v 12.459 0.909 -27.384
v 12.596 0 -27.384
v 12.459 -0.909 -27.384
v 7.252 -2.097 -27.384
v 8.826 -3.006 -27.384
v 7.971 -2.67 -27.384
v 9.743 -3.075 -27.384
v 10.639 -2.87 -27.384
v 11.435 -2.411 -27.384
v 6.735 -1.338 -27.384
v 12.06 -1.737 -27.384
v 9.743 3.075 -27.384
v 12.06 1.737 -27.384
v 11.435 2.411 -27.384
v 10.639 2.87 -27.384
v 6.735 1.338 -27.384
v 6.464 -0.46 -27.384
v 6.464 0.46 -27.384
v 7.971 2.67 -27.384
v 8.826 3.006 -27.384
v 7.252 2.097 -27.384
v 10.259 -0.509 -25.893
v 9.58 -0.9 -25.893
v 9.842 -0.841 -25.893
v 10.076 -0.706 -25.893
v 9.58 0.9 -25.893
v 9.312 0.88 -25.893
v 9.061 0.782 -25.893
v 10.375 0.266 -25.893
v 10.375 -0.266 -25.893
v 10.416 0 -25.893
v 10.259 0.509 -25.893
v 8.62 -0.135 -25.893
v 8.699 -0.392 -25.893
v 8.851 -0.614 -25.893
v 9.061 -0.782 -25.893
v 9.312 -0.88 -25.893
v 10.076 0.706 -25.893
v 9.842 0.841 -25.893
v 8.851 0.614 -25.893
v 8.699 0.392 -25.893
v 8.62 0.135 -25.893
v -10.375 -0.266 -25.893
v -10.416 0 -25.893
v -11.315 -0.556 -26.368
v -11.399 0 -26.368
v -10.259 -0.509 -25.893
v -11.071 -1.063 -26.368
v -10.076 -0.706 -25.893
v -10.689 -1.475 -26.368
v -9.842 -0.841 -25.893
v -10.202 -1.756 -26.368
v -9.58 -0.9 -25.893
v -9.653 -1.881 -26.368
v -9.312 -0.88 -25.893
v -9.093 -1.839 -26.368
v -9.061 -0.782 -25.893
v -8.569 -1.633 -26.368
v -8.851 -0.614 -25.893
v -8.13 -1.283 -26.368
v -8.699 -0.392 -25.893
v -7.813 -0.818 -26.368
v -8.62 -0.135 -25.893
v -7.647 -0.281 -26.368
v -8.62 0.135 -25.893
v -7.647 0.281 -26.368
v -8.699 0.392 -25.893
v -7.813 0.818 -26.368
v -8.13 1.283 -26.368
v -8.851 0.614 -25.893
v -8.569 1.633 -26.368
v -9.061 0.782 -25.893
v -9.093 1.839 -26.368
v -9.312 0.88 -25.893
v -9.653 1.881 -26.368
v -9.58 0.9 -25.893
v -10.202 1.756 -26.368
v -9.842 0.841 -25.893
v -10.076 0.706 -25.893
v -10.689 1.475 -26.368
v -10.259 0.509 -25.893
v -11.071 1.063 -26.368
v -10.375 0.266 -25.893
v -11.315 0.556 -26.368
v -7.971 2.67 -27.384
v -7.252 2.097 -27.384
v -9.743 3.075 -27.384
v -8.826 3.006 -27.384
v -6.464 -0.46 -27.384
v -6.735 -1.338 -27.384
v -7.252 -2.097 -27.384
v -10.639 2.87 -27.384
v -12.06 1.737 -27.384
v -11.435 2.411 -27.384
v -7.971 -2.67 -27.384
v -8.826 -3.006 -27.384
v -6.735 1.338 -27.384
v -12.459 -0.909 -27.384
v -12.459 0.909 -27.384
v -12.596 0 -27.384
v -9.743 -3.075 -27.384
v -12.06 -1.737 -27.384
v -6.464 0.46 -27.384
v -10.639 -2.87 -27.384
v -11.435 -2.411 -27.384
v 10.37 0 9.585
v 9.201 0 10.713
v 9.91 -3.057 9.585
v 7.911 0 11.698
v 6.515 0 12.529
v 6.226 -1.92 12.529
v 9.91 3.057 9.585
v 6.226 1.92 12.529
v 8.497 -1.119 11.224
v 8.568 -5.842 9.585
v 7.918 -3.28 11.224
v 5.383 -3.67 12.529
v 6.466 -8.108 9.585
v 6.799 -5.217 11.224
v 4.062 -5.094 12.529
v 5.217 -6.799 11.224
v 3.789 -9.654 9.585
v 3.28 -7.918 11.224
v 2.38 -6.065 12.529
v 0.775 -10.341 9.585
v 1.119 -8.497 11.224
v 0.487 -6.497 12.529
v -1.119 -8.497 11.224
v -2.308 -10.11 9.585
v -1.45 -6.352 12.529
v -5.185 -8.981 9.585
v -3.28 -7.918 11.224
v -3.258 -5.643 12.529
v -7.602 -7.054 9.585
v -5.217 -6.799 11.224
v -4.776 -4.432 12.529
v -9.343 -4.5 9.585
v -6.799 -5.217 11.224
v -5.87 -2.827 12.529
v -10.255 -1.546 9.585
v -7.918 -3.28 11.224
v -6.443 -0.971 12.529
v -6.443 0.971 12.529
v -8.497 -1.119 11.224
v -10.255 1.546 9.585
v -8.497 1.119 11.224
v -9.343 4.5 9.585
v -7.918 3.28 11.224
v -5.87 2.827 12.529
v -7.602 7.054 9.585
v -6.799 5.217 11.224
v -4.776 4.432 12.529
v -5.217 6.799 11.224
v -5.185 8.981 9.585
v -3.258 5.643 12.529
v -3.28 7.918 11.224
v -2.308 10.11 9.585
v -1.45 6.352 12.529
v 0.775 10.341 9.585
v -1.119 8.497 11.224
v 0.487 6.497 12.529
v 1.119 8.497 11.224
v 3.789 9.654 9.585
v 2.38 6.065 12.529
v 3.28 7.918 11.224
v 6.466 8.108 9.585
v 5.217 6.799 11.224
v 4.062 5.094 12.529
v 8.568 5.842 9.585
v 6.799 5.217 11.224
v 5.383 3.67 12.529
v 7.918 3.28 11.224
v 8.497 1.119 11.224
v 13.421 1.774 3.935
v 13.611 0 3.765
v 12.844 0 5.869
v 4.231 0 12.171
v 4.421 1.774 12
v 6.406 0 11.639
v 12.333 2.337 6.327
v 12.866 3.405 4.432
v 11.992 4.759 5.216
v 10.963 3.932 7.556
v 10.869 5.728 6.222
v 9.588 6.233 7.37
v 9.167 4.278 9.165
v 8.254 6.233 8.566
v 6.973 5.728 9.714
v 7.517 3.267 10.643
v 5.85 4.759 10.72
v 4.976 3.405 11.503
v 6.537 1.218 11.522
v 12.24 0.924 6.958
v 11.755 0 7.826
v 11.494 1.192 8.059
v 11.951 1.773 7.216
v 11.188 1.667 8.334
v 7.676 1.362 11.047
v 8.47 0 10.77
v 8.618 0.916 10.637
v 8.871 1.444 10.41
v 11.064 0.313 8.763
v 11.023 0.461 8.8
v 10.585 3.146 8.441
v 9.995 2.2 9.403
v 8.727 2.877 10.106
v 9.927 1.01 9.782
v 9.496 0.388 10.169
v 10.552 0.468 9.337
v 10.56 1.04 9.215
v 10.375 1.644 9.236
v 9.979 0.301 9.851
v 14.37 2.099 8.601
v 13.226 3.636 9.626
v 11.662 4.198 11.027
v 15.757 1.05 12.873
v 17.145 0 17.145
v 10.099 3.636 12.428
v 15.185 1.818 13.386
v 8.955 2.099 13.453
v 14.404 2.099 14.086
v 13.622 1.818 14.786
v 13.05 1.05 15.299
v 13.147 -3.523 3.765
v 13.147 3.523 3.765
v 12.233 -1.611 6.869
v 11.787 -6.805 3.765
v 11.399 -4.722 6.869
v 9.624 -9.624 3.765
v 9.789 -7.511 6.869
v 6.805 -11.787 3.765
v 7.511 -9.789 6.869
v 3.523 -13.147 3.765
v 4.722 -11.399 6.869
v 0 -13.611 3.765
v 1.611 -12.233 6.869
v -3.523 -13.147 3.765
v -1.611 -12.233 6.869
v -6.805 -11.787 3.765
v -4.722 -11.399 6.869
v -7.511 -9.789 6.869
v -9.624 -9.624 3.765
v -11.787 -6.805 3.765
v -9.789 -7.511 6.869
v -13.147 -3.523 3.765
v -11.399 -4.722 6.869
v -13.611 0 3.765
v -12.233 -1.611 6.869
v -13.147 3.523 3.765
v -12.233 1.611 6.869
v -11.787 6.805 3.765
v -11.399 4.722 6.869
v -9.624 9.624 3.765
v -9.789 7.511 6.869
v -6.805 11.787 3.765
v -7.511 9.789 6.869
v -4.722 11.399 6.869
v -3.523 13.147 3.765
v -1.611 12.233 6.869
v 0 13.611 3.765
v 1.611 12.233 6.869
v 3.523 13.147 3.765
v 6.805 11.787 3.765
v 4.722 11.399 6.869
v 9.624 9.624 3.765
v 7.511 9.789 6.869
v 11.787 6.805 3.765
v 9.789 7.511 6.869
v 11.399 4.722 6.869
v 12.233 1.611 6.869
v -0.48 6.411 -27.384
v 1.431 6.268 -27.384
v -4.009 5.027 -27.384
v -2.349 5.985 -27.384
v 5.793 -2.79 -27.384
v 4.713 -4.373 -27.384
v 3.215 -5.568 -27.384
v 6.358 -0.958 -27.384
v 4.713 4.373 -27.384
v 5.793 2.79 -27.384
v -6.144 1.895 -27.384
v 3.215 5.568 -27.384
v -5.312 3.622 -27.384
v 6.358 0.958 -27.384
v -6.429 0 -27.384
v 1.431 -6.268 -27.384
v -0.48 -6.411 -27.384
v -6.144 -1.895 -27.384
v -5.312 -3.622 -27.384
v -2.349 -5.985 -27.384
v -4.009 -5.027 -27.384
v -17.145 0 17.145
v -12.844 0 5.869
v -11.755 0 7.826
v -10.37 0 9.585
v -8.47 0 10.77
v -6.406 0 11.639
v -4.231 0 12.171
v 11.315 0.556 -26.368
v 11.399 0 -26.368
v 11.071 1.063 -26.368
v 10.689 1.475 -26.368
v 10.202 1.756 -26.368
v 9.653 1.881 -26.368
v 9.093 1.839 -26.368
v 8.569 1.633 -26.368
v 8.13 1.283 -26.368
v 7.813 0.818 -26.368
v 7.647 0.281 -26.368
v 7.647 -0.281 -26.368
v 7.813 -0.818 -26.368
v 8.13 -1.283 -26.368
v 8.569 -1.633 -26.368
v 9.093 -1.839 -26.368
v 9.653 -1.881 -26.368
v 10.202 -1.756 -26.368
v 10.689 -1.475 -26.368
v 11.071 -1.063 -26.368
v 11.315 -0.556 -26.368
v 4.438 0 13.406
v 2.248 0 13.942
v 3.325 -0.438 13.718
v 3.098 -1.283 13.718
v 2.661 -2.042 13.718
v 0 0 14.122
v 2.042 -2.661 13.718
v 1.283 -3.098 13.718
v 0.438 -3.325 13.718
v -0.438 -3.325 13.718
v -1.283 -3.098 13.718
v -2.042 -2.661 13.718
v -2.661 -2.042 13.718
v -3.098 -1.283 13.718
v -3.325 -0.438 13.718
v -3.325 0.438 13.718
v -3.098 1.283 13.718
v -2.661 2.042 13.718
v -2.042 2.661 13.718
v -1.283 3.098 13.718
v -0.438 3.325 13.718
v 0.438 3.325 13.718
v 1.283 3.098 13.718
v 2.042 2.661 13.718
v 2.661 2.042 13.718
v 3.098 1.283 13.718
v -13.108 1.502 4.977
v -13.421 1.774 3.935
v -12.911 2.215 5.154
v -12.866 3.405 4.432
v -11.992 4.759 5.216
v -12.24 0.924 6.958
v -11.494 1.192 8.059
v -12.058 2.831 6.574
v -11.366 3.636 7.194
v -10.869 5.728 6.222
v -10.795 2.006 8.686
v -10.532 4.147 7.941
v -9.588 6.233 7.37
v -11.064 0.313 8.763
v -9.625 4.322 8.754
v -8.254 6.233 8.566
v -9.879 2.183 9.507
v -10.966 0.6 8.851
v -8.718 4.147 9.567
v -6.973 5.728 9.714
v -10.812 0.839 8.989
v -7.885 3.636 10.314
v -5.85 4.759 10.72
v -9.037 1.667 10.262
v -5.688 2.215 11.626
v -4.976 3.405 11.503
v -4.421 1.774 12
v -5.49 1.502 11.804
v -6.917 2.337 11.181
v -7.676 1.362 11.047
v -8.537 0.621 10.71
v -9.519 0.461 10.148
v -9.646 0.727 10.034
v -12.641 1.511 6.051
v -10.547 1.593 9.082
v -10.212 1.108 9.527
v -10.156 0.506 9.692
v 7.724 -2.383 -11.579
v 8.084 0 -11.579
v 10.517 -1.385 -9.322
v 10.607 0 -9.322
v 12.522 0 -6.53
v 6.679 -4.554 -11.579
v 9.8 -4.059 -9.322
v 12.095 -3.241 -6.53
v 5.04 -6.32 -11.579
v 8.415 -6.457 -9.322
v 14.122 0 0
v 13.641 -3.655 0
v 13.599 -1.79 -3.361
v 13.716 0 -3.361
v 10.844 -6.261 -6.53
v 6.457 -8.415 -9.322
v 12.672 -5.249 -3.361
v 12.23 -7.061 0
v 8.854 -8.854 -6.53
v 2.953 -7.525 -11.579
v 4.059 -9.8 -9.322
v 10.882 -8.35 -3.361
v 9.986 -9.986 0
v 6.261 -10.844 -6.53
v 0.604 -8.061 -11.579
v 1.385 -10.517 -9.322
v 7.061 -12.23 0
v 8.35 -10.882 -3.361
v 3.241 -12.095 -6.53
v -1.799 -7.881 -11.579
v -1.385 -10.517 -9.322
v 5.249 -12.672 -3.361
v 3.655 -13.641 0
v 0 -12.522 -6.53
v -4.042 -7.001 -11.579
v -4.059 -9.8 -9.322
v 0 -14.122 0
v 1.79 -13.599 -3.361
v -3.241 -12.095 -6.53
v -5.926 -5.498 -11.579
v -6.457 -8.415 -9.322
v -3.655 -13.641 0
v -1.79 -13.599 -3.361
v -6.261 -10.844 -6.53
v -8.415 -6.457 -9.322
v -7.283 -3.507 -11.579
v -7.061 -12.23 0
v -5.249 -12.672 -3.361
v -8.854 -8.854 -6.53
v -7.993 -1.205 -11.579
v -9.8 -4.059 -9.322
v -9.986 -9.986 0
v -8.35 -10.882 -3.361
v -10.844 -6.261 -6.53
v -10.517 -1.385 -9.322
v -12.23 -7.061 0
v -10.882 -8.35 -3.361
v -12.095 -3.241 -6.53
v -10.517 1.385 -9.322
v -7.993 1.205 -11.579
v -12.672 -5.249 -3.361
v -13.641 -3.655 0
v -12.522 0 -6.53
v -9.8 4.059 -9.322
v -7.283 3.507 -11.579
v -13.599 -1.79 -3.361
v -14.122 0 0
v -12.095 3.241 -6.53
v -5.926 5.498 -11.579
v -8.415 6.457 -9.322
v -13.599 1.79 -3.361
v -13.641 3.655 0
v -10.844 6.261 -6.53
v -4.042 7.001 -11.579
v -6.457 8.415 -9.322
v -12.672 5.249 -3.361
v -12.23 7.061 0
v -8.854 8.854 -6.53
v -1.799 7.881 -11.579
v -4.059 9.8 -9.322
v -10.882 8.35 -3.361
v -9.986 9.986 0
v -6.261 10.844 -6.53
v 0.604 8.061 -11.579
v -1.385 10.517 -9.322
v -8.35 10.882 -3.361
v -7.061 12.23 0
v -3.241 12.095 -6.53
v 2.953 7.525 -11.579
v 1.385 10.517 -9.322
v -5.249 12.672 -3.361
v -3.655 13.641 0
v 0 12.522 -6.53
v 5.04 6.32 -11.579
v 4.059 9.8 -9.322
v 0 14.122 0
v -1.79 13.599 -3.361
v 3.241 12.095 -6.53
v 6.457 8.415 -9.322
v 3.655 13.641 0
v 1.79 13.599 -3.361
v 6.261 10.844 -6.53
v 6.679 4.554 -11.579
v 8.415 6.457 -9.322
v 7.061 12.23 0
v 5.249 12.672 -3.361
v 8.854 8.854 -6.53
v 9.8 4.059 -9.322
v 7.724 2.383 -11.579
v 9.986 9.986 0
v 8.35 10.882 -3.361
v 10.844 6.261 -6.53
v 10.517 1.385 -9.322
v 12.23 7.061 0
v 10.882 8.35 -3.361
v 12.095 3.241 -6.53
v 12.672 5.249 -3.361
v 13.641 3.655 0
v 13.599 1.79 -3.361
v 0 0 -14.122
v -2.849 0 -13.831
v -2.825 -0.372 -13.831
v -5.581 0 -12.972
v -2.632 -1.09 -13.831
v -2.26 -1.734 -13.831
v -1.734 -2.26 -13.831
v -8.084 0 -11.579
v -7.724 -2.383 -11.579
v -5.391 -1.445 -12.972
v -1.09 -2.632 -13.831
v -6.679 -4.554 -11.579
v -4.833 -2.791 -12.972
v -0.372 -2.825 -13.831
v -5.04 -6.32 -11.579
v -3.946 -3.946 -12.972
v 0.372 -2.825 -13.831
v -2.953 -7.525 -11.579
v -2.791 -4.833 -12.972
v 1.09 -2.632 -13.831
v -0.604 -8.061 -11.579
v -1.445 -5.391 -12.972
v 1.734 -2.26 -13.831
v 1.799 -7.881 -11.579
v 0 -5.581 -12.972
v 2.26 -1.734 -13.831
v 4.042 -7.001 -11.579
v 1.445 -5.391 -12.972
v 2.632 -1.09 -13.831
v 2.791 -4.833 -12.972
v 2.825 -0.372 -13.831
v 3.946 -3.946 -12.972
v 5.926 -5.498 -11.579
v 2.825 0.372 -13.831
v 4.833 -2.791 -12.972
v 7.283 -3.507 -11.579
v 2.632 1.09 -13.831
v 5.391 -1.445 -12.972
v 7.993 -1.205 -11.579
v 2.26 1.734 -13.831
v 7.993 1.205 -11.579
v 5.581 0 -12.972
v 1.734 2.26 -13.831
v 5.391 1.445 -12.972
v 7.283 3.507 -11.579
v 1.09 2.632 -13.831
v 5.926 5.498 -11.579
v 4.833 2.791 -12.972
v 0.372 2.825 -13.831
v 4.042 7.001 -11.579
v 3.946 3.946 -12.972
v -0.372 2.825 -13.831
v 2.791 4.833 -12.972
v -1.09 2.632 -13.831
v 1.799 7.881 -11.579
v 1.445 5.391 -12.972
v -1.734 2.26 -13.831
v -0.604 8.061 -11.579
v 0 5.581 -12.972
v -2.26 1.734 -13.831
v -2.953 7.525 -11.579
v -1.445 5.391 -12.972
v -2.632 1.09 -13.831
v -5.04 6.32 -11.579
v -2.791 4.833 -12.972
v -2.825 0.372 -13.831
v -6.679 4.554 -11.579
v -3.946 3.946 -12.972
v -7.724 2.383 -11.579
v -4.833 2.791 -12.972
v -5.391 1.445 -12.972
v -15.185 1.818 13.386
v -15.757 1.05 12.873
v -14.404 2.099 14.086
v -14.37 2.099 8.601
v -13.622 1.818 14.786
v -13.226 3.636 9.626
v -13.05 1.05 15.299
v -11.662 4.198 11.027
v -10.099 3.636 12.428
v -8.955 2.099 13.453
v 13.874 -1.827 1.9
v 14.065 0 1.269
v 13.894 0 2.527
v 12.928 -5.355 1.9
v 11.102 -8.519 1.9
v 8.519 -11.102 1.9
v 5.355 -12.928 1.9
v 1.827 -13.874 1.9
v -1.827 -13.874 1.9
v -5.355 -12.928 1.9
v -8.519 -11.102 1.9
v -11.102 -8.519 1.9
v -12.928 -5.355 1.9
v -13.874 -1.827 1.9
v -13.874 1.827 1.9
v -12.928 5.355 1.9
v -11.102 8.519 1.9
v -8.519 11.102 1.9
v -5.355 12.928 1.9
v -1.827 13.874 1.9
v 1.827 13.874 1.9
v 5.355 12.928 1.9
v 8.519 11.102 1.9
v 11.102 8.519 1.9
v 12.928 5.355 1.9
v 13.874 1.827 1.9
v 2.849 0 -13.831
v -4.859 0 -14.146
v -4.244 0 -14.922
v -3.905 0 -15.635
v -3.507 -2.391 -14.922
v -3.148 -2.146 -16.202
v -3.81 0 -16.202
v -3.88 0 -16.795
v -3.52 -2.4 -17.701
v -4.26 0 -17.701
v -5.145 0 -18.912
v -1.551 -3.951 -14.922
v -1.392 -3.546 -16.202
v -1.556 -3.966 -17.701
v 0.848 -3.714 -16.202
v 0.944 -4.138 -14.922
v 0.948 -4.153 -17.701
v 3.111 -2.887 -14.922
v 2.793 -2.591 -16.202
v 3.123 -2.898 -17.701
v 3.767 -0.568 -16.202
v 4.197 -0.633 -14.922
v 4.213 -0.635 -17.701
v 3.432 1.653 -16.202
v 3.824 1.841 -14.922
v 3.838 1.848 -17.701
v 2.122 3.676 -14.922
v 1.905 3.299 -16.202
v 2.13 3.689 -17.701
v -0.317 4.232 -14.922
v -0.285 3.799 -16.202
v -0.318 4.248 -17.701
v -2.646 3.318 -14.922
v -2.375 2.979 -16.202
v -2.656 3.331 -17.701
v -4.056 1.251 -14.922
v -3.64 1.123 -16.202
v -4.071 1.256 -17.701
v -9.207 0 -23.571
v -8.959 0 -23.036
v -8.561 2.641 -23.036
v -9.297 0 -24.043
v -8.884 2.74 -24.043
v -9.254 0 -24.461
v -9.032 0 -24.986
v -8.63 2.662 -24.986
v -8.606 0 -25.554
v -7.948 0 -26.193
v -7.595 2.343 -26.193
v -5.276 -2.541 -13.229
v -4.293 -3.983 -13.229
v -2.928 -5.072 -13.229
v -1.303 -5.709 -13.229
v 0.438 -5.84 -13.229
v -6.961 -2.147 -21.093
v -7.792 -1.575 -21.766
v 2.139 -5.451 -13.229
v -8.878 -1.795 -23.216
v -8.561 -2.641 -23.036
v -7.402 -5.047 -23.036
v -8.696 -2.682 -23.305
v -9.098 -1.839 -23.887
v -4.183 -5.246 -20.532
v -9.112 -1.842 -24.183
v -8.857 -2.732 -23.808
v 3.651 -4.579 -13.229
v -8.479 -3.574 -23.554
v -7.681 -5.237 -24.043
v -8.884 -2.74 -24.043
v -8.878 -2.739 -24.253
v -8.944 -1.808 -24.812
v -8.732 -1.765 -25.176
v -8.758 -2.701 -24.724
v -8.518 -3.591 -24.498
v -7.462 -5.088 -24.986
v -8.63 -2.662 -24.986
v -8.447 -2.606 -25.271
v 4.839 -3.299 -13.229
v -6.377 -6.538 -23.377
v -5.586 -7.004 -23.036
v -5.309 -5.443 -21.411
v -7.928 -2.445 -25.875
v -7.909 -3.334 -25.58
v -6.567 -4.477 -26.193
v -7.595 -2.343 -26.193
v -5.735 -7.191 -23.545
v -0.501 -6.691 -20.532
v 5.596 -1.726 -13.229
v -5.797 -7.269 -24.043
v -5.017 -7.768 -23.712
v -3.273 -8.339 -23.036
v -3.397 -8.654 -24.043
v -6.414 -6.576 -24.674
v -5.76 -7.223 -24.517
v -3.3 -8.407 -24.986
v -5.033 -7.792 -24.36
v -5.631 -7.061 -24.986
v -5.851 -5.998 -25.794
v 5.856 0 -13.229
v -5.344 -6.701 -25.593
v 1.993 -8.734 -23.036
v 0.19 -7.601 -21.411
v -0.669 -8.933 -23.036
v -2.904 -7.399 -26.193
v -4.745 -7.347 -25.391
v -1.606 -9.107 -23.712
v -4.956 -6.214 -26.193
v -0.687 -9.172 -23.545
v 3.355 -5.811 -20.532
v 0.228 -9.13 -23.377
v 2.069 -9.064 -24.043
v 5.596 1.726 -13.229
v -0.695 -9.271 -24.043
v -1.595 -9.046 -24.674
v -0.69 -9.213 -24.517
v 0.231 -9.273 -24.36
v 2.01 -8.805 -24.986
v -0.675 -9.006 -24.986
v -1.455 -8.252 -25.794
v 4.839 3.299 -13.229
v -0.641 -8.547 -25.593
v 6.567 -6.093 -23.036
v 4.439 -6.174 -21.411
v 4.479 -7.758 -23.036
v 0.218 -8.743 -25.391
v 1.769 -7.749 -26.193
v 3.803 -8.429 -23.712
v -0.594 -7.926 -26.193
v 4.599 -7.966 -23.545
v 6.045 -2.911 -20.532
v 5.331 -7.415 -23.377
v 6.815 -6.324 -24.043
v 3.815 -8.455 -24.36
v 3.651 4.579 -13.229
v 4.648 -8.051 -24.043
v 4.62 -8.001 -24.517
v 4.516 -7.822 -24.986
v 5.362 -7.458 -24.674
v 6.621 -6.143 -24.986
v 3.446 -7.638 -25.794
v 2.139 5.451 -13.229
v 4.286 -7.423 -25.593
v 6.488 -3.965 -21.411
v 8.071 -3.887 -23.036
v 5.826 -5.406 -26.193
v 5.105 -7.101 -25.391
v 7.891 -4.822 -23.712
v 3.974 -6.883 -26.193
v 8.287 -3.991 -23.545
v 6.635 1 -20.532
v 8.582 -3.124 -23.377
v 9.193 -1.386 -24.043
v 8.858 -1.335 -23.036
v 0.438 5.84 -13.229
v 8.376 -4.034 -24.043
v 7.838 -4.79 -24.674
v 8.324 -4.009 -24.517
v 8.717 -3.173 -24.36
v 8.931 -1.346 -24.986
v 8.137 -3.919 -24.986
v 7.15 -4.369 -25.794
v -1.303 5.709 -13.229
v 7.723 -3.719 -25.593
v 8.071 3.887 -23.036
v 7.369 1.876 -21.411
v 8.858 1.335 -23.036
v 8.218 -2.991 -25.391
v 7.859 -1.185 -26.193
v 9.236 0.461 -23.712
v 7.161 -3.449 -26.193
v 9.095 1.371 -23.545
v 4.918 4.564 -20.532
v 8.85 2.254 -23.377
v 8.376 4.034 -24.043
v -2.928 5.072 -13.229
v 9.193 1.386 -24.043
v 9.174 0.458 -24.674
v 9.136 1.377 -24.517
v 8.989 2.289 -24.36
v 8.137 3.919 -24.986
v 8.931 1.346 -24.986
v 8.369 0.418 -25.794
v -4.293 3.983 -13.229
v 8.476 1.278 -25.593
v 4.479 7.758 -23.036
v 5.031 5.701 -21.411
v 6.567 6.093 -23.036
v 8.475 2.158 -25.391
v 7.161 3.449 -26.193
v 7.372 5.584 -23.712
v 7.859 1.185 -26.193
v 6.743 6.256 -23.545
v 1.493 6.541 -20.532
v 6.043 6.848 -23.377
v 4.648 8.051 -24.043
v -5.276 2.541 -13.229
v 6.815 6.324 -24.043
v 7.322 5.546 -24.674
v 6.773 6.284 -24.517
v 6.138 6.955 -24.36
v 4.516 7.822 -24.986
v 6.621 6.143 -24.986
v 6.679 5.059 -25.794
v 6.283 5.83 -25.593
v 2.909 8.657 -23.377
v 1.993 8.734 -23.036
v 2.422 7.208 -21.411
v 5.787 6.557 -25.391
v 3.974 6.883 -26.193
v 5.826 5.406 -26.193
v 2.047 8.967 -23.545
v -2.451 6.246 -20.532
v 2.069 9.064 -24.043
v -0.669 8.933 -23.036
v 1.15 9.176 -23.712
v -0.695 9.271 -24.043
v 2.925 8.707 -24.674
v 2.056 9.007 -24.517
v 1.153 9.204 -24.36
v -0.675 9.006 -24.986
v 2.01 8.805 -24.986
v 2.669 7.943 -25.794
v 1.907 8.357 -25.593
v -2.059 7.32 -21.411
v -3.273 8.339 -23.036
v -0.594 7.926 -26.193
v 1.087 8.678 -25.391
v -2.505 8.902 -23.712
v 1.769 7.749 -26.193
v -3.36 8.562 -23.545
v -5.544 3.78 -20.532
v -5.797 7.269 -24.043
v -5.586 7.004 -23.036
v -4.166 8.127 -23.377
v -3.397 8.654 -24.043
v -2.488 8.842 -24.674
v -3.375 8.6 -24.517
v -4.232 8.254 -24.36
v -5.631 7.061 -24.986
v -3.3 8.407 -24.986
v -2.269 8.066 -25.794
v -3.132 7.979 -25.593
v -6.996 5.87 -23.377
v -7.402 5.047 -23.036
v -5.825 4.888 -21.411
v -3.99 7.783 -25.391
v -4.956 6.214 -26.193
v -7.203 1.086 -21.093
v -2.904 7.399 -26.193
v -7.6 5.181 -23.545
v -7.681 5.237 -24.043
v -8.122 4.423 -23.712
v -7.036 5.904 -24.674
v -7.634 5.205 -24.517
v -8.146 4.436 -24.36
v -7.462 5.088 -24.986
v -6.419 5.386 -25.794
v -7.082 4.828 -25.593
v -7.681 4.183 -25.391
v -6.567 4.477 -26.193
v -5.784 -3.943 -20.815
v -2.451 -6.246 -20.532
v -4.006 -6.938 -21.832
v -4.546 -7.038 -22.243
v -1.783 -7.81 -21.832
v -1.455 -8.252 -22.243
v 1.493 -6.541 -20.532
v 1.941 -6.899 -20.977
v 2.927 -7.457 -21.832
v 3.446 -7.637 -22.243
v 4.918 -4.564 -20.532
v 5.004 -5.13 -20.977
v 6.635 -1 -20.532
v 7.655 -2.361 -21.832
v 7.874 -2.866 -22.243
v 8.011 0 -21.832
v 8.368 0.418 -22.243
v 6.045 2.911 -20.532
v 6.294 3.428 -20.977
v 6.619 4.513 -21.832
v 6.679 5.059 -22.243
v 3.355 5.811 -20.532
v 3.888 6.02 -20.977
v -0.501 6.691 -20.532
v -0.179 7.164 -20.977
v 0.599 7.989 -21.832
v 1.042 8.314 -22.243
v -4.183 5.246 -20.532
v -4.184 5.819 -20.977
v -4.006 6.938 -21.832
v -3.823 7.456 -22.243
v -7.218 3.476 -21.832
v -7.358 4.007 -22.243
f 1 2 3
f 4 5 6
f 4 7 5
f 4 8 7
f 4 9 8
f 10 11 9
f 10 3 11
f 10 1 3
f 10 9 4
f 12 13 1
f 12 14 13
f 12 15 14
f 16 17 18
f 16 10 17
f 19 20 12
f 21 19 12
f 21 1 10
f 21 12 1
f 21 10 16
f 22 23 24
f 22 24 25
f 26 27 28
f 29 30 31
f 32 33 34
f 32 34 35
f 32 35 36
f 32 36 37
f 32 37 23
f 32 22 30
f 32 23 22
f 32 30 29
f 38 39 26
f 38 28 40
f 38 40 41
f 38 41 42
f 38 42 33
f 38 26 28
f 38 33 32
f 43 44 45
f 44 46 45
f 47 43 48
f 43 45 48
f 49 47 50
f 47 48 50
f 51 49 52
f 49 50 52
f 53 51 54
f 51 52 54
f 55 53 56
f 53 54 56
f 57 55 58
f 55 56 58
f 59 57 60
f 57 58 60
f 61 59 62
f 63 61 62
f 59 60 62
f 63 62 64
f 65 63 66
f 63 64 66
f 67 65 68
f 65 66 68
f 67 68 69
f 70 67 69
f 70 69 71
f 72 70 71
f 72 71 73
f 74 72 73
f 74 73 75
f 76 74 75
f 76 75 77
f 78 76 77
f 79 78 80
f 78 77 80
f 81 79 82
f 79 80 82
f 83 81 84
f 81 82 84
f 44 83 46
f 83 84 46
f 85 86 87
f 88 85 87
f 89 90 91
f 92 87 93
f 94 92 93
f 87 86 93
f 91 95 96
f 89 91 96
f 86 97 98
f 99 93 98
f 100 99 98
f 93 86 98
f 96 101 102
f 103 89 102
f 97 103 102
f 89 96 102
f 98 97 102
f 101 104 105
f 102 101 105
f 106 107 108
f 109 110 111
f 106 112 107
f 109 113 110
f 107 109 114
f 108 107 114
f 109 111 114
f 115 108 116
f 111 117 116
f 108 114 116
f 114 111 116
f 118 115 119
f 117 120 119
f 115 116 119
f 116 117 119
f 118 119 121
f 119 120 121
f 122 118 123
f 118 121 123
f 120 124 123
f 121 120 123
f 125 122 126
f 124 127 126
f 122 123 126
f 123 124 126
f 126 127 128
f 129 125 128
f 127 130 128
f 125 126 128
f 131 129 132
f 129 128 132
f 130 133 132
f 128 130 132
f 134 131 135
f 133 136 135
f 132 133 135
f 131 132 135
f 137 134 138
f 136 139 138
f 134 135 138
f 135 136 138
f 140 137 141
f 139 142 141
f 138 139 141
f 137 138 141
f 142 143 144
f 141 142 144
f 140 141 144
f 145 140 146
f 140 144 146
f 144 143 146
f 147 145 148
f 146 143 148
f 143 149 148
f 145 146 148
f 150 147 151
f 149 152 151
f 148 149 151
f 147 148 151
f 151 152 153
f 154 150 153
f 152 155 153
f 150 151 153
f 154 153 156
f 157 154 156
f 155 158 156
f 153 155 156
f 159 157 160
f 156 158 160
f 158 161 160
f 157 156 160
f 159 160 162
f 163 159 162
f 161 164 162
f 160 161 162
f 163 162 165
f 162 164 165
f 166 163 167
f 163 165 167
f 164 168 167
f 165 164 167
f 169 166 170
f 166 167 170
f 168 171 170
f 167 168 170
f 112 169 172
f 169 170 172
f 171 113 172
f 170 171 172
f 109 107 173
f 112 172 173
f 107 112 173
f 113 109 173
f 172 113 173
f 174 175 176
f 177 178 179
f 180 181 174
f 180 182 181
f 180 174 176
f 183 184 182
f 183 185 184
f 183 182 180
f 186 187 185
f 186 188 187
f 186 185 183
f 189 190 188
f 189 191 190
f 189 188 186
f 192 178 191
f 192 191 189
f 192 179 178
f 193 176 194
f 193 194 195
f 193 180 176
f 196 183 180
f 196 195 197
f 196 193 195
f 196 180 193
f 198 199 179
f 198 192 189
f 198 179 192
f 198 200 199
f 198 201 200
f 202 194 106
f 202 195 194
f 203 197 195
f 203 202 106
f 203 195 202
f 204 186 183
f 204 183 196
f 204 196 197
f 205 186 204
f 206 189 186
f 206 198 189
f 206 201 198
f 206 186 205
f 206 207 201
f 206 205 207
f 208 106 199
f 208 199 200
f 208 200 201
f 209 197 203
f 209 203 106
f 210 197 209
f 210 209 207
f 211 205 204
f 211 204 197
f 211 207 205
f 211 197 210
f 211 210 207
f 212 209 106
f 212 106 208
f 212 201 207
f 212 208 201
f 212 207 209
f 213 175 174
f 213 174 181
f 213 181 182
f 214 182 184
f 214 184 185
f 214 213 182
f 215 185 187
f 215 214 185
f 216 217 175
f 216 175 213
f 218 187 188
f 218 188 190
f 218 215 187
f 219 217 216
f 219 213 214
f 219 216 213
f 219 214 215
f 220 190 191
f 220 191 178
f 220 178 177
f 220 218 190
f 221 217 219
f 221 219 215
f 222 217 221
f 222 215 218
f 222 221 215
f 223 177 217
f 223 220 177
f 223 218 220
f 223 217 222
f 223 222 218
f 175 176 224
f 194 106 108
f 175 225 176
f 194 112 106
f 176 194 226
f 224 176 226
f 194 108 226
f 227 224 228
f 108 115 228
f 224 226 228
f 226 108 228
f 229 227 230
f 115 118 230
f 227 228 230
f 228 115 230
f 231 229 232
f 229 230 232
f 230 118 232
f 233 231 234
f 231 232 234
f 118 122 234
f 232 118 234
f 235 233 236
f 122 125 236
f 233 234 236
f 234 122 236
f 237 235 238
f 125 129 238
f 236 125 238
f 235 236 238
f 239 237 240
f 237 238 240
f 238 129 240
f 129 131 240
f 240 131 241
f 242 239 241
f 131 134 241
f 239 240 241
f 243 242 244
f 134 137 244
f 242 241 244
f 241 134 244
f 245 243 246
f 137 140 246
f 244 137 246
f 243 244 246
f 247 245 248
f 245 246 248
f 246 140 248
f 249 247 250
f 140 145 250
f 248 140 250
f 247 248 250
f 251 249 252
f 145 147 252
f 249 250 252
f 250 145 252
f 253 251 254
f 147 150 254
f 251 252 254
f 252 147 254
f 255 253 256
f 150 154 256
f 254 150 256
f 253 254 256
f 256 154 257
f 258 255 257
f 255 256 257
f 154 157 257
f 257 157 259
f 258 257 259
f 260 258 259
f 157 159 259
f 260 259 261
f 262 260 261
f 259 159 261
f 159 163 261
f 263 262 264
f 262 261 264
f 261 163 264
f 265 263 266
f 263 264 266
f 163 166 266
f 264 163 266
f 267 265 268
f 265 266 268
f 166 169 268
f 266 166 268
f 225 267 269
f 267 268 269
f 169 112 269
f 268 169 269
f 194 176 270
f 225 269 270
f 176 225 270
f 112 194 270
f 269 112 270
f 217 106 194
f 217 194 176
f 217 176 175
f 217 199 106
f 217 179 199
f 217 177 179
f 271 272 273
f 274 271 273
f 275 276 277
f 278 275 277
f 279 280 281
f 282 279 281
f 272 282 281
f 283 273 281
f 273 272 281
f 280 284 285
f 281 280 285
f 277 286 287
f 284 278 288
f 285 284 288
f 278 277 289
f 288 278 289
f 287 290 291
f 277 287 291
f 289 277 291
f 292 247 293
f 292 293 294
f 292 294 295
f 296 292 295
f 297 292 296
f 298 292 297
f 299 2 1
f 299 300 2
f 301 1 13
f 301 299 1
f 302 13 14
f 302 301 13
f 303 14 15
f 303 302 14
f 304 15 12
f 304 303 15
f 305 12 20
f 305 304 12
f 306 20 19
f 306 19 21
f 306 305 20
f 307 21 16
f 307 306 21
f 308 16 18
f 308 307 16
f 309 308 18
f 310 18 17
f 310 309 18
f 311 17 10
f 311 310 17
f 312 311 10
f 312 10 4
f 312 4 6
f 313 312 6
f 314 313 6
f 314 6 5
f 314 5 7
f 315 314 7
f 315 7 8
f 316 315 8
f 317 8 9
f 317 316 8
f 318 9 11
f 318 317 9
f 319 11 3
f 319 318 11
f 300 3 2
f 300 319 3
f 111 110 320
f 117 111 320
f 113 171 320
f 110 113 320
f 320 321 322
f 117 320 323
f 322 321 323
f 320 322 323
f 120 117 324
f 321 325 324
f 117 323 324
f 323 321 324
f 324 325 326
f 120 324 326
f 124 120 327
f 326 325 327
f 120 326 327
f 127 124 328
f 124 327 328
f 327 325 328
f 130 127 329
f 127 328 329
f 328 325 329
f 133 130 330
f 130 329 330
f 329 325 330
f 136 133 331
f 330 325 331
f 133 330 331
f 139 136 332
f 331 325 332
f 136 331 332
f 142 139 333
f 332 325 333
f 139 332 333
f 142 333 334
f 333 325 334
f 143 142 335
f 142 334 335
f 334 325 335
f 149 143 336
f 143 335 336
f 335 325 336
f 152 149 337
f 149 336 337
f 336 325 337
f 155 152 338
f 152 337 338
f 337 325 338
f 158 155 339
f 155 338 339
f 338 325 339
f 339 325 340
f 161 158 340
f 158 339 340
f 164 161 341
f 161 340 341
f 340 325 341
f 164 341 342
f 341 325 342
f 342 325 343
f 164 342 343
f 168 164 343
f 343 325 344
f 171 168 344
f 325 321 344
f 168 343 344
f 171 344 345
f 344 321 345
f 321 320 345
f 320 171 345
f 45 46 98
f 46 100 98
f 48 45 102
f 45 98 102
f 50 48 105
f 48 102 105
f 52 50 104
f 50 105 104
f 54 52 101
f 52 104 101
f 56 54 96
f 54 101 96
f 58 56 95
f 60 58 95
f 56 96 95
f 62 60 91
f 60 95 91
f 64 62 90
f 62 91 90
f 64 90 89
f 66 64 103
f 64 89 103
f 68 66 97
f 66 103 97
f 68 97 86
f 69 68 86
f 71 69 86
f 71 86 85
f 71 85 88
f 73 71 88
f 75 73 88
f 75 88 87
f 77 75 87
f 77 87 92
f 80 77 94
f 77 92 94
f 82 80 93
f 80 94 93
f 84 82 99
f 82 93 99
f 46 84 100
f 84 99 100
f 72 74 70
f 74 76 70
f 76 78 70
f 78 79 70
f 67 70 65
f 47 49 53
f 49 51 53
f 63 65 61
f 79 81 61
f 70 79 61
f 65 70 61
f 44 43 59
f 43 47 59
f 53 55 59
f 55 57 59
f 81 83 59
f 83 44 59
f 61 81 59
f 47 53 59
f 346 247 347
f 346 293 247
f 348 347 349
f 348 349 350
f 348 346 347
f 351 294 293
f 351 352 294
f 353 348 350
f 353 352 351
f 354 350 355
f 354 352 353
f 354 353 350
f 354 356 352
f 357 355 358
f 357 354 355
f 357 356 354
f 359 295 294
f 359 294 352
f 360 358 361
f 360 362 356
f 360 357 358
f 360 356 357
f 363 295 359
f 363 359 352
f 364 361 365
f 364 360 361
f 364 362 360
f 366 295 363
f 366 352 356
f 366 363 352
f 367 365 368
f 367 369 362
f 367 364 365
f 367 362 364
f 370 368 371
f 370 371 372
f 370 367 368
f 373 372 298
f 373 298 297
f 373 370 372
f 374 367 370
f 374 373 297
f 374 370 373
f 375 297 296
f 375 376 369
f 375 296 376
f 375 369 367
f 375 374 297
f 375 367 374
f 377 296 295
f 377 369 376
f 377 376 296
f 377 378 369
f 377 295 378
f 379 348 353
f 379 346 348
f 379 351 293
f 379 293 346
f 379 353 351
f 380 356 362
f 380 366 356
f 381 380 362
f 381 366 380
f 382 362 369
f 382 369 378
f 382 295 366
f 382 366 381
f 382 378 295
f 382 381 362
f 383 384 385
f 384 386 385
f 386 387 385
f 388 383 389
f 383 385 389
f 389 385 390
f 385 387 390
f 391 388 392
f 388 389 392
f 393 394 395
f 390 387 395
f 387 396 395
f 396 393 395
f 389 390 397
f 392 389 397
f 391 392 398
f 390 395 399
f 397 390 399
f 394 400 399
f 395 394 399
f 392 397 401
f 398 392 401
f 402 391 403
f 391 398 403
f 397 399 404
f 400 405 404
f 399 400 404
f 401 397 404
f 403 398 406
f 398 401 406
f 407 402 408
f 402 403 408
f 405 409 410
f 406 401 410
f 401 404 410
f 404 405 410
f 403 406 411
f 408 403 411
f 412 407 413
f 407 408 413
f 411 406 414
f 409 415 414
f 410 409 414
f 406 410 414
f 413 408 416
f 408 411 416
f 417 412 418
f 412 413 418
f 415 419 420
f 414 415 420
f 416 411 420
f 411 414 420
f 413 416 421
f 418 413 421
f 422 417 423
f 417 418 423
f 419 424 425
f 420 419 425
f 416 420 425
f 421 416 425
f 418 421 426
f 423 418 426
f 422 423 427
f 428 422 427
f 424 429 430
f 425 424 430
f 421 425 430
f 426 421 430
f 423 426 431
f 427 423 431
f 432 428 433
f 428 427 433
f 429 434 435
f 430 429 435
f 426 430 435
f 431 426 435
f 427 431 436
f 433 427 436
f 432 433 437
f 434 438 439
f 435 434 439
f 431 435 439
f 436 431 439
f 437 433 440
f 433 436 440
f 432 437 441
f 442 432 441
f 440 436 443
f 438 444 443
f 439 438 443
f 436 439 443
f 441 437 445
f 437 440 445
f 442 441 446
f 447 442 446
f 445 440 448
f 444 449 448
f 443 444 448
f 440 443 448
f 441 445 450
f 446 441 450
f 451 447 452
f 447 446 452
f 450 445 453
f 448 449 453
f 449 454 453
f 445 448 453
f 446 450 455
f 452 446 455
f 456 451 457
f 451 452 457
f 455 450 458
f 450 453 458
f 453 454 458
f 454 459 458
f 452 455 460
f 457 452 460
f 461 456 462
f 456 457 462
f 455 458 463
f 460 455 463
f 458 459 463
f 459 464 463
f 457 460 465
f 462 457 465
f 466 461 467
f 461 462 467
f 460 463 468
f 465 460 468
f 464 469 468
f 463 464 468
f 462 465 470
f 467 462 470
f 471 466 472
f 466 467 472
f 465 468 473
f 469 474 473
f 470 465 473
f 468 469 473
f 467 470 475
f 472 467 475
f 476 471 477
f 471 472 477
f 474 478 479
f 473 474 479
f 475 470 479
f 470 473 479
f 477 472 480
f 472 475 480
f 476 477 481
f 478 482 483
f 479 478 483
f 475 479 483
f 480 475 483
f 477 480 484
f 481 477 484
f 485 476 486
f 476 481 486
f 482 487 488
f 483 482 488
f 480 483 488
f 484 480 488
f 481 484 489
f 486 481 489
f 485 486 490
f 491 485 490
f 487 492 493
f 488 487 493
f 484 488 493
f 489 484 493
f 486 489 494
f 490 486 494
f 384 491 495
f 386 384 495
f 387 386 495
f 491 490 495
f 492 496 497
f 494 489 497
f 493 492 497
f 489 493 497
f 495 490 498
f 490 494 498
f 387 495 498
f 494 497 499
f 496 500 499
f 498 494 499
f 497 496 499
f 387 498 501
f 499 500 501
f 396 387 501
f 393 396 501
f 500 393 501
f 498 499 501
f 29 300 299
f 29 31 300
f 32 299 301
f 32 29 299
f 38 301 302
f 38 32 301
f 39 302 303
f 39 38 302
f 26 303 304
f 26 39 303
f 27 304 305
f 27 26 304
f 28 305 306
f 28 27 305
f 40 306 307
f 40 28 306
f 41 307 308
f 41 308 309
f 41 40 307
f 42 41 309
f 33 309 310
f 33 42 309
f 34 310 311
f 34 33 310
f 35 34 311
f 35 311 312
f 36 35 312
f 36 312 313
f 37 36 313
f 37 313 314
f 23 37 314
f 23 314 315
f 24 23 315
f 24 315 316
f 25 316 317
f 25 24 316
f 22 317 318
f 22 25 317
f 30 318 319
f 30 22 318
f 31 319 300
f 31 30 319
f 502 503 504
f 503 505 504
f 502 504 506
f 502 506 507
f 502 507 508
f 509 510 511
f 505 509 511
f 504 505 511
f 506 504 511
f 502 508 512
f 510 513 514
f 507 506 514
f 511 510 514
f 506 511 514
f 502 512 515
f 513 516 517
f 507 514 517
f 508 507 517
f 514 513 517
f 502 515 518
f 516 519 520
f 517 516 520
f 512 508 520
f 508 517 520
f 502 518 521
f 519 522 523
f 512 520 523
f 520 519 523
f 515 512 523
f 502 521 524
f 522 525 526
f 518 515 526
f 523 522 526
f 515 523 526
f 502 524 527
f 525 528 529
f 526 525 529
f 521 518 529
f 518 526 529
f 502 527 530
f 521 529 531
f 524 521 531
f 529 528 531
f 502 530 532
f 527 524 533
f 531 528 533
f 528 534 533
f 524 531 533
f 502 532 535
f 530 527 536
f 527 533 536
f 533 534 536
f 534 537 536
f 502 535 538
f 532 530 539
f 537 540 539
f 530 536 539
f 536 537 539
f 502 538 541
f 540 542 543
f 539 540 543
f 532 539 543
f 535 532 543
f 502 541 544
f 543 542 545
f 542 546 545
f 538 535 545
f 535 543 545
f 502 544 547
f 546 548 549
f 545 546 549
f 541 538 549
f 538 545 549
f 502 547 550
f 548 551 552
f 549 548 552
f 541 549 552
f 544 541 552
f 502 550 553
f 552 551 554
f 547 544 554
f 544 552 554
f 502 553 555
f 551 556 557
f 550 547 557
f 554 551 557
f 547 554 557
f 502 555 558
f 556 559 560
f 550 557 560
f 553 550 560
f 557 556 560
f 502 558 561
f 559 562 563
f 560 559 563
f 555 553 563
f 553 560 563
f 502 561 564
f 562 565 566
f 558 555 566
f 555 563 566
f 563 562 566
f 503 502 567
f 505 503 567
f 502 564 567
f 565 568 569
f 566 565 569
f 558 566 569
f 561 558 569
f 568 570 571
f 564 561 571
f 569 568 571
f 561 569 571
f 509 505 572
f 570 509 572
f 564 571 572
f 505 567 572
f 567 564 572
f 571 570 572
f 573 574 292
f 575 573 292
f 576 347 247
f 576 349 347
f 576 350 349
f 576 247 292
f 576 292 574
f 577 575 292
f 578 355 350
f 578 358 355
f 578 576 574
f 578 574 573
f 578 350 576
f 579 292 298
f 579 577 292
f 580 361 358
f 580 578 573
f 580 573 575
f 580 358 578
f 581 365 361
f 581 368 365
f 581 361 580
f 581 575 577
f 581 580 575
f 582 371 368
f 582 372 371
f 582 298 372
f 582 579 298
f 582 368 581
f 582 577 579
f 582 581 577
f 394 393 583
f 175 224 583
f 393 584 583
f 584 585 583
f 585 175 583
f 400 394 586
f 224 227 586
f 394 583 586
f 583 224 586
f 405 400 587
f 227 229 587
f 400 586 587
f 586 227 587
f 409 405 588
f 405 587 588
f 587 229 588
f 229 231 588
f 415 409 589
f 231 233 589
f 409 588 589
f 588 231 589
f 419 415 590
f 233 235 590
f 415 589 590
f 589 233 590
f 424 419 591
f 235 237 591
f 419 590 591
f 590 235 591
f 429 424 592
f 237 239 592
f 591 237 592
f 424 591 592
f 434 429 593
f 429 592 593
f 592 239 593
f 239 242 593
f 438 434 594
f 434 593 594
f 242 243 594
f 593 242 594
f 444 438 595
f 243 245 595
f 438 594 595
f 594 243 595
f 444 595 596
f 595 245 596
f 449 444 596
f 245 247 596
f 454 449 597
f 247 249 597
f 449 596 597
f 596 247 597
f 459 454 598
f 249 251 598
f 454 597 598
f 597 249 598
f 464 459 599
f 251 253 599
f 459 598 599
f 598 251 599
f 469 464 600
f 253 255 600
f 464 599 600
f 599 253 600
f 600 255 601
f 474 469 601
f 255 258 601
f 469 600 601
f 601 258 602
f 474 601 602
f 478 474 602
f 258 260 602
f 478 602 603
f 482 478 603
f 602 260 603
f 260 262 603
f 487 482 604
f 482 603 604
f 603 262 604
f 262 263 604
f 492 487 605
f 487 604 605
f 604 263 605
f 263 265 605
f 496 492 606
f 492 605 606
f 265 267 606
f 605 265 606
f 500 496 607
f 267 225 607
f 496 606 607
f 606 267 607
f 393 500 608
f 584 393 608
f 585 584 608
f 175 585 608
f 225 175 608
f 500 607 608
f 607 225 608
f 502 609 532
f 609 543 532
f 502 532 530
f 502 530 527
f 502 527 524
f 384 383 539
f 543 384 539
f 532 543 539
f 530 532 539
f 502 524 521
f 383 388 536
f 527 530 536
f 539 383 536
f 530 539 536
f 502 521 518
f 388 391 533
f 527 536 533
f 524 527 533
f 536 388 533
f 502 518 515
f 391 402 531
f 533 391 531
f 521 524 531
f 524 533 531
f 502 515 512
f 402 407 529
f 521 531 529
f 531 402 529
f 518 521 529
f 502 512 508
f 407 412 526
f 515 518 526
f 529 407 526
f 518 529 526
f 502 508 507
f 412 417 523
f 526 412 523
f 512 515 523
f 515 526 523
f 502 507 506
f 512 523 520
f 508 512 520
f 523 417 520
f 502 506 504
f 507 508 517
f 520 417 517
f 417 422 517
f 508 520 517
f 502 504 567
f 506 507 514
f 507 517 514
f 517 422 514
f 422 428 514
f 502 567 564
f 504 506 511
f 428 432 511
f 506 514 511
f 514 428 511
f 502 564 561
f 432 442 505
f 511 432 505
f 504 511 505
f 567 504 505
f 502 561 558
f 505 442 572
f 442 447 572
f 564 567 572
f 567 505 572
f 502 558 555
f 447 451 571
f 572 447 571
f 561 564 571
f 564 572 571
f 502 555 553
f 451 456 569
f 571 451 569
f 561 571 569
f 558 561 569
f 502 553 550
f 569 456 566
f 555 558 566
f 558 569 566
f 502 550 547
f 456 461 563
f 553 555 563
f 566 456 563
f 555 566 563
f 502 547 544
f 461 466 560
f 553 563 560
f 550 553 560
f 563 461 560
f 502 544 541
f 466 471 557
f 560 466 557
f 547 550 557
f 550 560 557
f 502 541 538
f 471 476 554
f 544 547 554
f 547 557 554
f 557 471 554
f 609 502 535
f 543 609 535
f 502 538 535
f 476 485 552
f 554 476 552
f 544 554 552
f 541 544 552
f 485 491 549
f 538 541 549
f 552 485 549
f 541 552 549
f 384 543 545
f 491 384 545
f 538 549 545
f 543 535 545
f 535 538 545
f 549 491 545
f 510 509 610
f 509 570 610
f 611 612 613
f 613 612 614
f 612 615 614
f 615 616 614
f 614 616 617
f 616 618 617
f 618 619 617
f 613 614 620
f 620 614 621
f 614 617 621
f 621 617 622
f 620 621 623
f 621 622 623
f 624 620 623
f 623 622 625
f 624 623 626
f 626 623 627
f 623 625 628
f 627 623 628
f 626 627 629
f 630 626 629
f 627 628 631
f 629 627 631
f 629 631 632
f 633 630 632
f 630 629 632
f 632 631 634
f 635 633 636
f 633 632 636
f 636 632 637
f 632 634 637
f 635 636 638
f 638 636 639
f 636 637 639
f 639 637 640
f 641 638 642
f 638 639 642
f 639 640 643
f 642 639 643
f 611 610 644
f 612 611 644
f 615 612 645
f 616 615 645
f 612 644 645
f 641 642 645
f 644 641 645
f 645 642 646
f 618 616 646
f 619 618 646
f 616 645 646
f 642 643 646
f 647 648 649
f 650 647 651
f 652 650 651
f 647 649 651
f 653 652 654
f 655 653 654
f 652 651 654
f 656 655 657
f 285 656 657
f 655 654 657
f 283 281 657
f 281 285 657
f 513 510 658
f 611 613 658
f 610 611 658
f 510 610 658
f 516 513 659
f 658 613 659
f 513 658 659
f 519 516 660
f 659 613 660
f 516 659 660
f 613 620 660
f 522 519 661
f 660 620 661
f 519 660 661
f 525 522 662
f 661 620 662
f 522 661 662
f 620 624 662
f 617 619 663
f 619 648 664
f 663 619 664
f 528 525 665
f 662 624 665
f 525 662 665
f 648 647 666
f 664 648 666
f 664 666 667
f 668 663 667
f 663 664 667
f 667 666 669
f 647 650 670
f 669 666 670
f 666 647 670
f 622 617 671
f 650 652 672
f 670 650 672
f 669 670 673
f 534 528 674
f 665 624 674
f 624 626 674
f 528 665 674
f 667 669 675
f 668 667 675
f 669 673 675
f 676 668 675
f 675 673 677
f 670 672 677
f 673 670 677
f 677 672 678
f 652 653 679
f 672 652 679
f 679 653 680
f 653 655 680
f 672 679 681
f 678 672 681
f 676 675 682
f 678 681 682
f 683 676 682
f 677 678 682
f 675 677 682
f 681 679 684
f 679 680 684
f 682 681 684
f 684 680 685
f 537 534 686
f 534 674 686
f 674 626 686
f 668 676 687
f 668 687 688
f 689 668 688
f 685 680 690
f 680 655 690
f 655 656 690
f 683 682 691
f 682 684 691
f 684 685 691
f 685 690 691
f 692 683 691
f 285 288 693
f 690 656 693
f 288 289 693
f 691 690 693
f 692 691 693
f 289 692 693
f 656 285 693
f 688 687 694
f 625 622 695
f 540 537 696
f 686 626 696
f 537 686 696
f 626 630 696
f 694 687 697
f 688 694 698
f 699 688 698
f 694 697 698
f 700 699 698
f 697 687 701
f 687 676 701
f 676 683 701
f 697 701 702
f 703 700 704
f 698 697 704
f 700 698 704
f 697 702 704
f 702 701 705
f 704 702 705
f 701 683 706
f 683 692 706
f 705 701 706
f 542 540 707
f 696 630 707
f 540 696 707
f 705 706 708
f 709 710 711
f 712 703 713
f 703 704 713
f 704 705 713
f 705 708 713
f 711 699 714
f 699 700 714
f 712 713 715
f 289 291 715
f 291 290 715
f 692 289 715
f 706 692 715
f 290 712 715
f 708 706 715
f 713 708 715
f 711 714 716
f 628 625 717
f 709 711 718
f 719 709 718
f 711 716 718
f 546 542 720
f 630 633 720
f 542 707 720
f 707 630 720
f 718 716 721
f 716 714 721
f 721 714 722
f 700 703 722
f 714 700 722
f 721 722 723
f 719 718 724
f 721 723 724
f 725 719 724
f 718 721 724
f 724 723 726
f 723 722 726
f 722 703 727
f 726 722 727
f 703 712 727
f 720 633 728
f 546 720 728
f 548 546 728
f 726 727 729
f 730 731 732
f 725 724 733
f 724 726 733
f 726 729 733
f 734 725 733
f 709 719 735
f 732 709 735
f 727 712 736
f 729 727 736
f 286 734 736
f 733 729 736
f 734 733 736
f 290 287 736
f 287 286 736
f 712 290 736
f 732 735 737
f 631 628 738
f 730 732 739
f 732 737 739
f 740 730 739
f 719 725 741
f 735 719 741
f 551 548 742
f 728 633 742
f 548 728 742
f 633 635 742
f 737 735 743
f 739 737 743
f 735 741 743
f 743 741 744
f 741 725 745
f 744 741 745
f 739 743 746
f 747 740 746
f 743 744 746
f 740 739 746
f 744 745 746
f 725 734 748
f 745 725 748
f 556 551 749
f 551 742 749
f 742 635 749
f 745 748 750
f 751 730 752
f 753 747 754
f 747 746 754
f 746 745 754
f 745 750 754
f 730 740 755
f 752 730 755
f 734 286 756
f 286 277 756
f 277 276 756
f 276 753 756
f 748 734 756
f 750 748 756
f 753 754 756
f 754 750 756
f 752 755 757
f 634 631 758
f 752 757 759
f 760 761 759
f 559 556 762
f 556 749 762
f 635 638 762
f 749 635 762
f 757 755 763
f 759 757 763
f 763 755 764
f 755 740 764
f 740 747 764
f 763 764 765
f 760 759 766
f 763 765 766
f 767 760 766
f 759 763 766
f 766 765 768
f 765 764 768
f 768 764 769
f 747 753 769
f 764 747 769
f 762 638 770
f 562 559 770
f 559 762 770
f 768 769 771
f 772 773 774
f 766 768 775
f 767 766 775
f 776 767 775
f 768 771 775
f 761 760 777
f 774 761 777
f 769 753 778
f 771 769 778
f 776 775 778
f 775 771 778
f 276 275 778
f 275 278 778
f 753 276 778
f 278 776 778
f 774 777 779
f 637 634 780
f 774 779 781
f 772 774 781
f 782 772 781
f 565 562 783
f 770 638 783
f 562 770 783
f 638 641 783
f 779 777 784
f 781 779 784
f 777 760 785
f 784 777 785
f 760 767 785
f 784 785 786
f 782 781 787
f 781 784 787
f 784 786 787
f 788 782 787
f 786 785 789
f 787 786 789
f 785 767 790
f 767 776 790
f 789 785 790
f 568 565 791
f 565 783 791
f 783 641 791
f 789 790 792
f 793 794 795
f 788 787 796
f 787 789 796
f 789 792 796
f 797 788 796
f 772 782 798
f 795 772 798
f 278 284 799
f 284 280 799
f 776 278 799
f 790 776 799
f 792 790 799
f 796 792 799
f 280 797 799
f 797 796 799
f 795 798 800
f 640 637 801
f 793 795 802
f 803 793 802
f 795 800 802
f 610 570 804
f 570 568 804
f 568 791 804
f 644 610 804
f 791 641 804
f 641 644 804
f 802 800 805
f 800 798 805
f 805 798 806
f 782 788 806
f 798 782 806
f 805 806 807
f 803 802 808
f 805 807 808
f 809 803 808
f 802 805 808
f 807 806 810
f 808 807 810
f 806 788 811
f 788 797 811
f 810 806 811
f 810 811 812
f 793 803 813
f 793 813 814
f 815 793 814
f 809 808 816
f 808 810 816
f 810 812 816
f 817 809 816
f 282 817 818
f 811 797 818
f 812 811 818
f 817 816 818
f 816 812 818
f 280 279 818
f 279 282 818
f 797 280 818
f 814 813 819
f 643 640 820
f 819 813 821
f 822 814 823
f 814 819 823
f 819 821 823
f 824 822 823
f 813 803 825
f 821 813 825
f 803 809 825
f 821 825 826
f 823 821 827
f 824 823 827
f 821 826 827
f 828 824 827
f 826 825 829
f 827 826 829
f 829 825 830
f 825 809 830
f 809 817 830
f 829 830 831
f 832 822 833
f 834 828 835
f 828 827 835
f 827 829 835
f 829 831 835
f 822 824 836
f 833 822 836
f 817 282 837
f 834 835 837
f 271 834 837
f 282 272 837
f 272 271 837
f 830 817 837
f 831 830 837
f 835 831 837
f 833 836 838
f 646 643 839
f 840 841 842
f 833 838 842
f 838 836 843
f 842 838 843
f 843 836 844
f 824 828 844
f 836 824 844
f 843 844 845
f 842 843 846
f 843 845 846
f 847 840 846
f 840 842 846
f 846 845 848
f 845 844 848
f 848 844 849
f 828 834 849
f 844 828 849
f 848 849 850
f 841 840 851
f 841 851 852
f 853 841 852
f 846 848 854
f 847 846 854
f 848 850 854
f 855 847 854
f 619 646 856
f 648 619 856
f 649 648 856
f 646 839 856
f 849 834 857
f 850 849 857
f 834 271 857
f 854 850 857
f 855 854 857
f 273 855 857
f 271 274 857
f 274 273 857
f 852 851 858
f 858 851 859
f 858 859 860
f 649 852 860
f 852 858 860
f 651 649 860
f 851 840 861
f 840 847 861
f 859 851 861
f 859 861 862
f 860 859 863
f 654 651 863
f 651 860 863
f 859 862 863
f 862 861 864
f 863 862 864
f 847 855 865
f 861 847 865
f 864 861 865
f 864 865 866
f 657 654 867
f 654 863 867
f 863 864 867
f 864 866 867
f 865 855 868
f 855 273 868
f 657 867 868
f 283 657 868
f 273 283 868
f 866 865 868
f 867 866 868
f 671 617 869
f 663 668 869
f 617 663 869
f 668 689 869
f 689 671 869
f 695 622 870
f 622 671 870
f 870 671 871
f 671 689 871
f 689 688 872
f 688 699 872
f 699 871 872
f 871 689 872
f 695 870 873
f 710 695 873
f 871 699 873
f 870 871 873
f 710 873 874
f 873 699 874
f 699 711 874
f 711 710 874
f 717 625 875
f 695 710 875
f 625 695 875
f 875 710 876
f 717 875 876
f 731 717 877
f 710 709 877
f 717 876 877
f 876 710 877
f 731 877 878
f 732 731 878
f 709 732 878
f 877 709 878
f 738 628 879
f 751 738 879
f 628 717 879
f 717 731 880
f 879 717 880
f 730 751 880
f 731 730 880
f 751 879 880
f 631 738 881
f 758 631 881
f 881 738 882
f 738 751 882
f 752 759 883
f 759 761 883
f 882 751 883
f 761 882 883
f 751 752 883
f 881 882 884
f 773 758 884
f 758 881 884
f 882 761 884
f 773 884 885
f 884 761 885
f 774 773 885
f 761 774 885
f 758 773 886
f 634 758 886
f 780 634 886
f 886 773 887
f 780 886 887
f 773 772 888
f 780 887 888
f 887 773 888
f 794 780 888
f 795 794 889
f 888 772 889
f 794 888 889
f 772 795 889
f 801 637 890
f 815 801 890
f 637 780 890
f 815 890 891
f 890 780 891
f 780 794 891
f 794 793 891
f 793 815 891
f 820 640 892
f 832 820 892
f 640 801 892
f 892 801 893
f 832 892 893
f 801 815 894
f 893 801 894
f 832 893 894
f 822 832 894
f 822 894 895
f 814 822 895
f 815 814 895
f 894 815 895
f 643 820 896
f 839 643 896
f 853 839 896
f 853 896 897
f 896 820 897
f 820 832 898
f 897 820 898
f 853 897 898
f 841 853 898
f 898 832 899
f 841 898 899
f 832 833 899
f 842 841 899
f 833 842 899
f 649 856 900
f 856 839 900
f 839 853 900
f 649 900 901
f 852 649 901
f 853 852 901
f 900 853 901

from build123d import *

# Parameters (mm, degrees)
F5_ANGLE = 180
F6_ANGLE = 180


with BuildPart() as f1:
    # F0 (on Front) → F1 (revolve)
    with BuildSketch(Plane.XZ):
        Polygon((-12.5956879929, -27.3843761533), (-9.5125313383, -27.3843761533), (-9.5125313383, -25.8927680552), (-10.4155214503, -25.8927680552), (-11.3987335935, -26.3682848997), align=None)
    revolve(axis=Axis((-9.5125313383, 0, -26.6385721043), (0, 0, 1)))


with BuildPart() as f2:
    # F0 (on Front) → F2 (revolve)
    with BuildSketch(Plane.XZ):
        Polygon((9.5125313383, -25.8927680552), (9.5125313383, -27.3843761533), (12.5956879929, -27.3843761533), (11.3987335935, -26.3682848997), (10.4155214503, -25.8927680552), align=None)
    revolve(axis=Axis((9.5125313383, 0, -26.6385721043), (0, 0, 1)))


with BuildPart() as f3:
    # F0 (on Front) → F3 (revolve)
    with BuildSketch(Plane.XZ):
        with BuildLine():
            Line((0, -27.3843761533), (0, -14.1218369735))
            ThreePointArc((0, -14.1218369735), (-4.2370057591, -13.4712308904), (-8.0836059746, -11.5793606885))
            add(Edge.make_bspline(
                [(-8.0836059746, -11.5793606885), (-5.9708379387, -13.0684049177), (-1.8274448123, -15.9900946539), (-7.1617027451, -20.87812623), (-10.4709666326, -24.3666738575), (-7.7902073219, -26.3682848997), (-6.4293746836, -27.3843761533)],
                knots=[0, 0, 0, 0, 0.2798102366, 0.5488431958, 0.7709765526, 1, 1, 1, 1], degree=3))
            Line((-6.4293746836, -27.3843761533), (0, -27.3843761533))
        make_face()
    revolve(axis=Axis((0, 0, -20.7531065634), (0, 0, 1)))


with BuildPart() as f4:
    # F0 (on Front) → F4 (revolve)
    with BuildSketch(Plane.XZ):
        with BuildLine():
            ThreePointArc((8.0836059746, -11.5793606885), (12.5216142178, -6.5295832094), (14.1218369735, 0))
            ThreePointArc((14.1218369735, 0), (13.9934517562, 1.8998914318), (13.6106304698, 3.7652380697))
            ThreePointArc((13.6106304698, 3.7652380697), (12.3386270645, 6.869101955), (10.3704577179, 9.5853996384))
            ThreePointArc((10.3704577179, 9.5853996384), (8.5702660374, 11.2239395737), (6.5154281839, 12.5289853973))
            ThreePointArc((6.5154281839, 12.5289853973), (3.3536539984, 13.717845471), (0, 14.1218369735))
            Line((0, 14.1218369735), (0, -14.1218369735))
            ThreePointArc((0, -14.1218369735), (4.2370057591, -13.4712308904), (8.0836059746, -11.5793606885))
        make_face()
    revolve(axis=Axis((0, 0, 0), (0, 0, -1)))


with BuildPart() as f5:
    # F0 (on Front) → F5 (revolve)
    with BuildSketch(Plane.XZ):
        with BuildLine():
            Line((-17.1450003982, 17.1450003982), (-13.6106304698, 3.7652380697))
            ThreePointArc((-13.6106304698, 3.7652380697), (-12.3386270645, 6.869101955), (-10.3704577179, 9.5853996384))
            Line((-10.3704577179, 9.5853996384), (-17.1450003982, 17.1450003982))
        make_face()
    revolve(axis=Axis((-13.757729058, 0, 13.3652000183), (0.6673794965, 0, -0.7447178041)), revolution_arc=F5_ANGLE)


with BuildPart() as f6:
    # F0 (on Front) → F6 (revolve)
    with BuildSketch(Plane.XZ):
        with BuildLine():
            ThreePointArc((10.3704577179, 9.5853996384), (12.3386270645, 6.869101955), (13.6106304698, 3.7652380697))
            Line((13.6106304698, 3.7652380697), (17.1450003982, 17.1450003982))
            Line((17.1450003982, 17.1450003982), (10.3704577179, 9.5853996384))
        make_face()
    revolve(axis=Axis((13.757729058, 0, 13.3652000183), (0.6673794965, 0, 0.7447178041)), revolution_arc=F6_ANGLE)


solid = Compound([f1.part, f2.part, f3.part, f4.part, f5.part, f6.part])
